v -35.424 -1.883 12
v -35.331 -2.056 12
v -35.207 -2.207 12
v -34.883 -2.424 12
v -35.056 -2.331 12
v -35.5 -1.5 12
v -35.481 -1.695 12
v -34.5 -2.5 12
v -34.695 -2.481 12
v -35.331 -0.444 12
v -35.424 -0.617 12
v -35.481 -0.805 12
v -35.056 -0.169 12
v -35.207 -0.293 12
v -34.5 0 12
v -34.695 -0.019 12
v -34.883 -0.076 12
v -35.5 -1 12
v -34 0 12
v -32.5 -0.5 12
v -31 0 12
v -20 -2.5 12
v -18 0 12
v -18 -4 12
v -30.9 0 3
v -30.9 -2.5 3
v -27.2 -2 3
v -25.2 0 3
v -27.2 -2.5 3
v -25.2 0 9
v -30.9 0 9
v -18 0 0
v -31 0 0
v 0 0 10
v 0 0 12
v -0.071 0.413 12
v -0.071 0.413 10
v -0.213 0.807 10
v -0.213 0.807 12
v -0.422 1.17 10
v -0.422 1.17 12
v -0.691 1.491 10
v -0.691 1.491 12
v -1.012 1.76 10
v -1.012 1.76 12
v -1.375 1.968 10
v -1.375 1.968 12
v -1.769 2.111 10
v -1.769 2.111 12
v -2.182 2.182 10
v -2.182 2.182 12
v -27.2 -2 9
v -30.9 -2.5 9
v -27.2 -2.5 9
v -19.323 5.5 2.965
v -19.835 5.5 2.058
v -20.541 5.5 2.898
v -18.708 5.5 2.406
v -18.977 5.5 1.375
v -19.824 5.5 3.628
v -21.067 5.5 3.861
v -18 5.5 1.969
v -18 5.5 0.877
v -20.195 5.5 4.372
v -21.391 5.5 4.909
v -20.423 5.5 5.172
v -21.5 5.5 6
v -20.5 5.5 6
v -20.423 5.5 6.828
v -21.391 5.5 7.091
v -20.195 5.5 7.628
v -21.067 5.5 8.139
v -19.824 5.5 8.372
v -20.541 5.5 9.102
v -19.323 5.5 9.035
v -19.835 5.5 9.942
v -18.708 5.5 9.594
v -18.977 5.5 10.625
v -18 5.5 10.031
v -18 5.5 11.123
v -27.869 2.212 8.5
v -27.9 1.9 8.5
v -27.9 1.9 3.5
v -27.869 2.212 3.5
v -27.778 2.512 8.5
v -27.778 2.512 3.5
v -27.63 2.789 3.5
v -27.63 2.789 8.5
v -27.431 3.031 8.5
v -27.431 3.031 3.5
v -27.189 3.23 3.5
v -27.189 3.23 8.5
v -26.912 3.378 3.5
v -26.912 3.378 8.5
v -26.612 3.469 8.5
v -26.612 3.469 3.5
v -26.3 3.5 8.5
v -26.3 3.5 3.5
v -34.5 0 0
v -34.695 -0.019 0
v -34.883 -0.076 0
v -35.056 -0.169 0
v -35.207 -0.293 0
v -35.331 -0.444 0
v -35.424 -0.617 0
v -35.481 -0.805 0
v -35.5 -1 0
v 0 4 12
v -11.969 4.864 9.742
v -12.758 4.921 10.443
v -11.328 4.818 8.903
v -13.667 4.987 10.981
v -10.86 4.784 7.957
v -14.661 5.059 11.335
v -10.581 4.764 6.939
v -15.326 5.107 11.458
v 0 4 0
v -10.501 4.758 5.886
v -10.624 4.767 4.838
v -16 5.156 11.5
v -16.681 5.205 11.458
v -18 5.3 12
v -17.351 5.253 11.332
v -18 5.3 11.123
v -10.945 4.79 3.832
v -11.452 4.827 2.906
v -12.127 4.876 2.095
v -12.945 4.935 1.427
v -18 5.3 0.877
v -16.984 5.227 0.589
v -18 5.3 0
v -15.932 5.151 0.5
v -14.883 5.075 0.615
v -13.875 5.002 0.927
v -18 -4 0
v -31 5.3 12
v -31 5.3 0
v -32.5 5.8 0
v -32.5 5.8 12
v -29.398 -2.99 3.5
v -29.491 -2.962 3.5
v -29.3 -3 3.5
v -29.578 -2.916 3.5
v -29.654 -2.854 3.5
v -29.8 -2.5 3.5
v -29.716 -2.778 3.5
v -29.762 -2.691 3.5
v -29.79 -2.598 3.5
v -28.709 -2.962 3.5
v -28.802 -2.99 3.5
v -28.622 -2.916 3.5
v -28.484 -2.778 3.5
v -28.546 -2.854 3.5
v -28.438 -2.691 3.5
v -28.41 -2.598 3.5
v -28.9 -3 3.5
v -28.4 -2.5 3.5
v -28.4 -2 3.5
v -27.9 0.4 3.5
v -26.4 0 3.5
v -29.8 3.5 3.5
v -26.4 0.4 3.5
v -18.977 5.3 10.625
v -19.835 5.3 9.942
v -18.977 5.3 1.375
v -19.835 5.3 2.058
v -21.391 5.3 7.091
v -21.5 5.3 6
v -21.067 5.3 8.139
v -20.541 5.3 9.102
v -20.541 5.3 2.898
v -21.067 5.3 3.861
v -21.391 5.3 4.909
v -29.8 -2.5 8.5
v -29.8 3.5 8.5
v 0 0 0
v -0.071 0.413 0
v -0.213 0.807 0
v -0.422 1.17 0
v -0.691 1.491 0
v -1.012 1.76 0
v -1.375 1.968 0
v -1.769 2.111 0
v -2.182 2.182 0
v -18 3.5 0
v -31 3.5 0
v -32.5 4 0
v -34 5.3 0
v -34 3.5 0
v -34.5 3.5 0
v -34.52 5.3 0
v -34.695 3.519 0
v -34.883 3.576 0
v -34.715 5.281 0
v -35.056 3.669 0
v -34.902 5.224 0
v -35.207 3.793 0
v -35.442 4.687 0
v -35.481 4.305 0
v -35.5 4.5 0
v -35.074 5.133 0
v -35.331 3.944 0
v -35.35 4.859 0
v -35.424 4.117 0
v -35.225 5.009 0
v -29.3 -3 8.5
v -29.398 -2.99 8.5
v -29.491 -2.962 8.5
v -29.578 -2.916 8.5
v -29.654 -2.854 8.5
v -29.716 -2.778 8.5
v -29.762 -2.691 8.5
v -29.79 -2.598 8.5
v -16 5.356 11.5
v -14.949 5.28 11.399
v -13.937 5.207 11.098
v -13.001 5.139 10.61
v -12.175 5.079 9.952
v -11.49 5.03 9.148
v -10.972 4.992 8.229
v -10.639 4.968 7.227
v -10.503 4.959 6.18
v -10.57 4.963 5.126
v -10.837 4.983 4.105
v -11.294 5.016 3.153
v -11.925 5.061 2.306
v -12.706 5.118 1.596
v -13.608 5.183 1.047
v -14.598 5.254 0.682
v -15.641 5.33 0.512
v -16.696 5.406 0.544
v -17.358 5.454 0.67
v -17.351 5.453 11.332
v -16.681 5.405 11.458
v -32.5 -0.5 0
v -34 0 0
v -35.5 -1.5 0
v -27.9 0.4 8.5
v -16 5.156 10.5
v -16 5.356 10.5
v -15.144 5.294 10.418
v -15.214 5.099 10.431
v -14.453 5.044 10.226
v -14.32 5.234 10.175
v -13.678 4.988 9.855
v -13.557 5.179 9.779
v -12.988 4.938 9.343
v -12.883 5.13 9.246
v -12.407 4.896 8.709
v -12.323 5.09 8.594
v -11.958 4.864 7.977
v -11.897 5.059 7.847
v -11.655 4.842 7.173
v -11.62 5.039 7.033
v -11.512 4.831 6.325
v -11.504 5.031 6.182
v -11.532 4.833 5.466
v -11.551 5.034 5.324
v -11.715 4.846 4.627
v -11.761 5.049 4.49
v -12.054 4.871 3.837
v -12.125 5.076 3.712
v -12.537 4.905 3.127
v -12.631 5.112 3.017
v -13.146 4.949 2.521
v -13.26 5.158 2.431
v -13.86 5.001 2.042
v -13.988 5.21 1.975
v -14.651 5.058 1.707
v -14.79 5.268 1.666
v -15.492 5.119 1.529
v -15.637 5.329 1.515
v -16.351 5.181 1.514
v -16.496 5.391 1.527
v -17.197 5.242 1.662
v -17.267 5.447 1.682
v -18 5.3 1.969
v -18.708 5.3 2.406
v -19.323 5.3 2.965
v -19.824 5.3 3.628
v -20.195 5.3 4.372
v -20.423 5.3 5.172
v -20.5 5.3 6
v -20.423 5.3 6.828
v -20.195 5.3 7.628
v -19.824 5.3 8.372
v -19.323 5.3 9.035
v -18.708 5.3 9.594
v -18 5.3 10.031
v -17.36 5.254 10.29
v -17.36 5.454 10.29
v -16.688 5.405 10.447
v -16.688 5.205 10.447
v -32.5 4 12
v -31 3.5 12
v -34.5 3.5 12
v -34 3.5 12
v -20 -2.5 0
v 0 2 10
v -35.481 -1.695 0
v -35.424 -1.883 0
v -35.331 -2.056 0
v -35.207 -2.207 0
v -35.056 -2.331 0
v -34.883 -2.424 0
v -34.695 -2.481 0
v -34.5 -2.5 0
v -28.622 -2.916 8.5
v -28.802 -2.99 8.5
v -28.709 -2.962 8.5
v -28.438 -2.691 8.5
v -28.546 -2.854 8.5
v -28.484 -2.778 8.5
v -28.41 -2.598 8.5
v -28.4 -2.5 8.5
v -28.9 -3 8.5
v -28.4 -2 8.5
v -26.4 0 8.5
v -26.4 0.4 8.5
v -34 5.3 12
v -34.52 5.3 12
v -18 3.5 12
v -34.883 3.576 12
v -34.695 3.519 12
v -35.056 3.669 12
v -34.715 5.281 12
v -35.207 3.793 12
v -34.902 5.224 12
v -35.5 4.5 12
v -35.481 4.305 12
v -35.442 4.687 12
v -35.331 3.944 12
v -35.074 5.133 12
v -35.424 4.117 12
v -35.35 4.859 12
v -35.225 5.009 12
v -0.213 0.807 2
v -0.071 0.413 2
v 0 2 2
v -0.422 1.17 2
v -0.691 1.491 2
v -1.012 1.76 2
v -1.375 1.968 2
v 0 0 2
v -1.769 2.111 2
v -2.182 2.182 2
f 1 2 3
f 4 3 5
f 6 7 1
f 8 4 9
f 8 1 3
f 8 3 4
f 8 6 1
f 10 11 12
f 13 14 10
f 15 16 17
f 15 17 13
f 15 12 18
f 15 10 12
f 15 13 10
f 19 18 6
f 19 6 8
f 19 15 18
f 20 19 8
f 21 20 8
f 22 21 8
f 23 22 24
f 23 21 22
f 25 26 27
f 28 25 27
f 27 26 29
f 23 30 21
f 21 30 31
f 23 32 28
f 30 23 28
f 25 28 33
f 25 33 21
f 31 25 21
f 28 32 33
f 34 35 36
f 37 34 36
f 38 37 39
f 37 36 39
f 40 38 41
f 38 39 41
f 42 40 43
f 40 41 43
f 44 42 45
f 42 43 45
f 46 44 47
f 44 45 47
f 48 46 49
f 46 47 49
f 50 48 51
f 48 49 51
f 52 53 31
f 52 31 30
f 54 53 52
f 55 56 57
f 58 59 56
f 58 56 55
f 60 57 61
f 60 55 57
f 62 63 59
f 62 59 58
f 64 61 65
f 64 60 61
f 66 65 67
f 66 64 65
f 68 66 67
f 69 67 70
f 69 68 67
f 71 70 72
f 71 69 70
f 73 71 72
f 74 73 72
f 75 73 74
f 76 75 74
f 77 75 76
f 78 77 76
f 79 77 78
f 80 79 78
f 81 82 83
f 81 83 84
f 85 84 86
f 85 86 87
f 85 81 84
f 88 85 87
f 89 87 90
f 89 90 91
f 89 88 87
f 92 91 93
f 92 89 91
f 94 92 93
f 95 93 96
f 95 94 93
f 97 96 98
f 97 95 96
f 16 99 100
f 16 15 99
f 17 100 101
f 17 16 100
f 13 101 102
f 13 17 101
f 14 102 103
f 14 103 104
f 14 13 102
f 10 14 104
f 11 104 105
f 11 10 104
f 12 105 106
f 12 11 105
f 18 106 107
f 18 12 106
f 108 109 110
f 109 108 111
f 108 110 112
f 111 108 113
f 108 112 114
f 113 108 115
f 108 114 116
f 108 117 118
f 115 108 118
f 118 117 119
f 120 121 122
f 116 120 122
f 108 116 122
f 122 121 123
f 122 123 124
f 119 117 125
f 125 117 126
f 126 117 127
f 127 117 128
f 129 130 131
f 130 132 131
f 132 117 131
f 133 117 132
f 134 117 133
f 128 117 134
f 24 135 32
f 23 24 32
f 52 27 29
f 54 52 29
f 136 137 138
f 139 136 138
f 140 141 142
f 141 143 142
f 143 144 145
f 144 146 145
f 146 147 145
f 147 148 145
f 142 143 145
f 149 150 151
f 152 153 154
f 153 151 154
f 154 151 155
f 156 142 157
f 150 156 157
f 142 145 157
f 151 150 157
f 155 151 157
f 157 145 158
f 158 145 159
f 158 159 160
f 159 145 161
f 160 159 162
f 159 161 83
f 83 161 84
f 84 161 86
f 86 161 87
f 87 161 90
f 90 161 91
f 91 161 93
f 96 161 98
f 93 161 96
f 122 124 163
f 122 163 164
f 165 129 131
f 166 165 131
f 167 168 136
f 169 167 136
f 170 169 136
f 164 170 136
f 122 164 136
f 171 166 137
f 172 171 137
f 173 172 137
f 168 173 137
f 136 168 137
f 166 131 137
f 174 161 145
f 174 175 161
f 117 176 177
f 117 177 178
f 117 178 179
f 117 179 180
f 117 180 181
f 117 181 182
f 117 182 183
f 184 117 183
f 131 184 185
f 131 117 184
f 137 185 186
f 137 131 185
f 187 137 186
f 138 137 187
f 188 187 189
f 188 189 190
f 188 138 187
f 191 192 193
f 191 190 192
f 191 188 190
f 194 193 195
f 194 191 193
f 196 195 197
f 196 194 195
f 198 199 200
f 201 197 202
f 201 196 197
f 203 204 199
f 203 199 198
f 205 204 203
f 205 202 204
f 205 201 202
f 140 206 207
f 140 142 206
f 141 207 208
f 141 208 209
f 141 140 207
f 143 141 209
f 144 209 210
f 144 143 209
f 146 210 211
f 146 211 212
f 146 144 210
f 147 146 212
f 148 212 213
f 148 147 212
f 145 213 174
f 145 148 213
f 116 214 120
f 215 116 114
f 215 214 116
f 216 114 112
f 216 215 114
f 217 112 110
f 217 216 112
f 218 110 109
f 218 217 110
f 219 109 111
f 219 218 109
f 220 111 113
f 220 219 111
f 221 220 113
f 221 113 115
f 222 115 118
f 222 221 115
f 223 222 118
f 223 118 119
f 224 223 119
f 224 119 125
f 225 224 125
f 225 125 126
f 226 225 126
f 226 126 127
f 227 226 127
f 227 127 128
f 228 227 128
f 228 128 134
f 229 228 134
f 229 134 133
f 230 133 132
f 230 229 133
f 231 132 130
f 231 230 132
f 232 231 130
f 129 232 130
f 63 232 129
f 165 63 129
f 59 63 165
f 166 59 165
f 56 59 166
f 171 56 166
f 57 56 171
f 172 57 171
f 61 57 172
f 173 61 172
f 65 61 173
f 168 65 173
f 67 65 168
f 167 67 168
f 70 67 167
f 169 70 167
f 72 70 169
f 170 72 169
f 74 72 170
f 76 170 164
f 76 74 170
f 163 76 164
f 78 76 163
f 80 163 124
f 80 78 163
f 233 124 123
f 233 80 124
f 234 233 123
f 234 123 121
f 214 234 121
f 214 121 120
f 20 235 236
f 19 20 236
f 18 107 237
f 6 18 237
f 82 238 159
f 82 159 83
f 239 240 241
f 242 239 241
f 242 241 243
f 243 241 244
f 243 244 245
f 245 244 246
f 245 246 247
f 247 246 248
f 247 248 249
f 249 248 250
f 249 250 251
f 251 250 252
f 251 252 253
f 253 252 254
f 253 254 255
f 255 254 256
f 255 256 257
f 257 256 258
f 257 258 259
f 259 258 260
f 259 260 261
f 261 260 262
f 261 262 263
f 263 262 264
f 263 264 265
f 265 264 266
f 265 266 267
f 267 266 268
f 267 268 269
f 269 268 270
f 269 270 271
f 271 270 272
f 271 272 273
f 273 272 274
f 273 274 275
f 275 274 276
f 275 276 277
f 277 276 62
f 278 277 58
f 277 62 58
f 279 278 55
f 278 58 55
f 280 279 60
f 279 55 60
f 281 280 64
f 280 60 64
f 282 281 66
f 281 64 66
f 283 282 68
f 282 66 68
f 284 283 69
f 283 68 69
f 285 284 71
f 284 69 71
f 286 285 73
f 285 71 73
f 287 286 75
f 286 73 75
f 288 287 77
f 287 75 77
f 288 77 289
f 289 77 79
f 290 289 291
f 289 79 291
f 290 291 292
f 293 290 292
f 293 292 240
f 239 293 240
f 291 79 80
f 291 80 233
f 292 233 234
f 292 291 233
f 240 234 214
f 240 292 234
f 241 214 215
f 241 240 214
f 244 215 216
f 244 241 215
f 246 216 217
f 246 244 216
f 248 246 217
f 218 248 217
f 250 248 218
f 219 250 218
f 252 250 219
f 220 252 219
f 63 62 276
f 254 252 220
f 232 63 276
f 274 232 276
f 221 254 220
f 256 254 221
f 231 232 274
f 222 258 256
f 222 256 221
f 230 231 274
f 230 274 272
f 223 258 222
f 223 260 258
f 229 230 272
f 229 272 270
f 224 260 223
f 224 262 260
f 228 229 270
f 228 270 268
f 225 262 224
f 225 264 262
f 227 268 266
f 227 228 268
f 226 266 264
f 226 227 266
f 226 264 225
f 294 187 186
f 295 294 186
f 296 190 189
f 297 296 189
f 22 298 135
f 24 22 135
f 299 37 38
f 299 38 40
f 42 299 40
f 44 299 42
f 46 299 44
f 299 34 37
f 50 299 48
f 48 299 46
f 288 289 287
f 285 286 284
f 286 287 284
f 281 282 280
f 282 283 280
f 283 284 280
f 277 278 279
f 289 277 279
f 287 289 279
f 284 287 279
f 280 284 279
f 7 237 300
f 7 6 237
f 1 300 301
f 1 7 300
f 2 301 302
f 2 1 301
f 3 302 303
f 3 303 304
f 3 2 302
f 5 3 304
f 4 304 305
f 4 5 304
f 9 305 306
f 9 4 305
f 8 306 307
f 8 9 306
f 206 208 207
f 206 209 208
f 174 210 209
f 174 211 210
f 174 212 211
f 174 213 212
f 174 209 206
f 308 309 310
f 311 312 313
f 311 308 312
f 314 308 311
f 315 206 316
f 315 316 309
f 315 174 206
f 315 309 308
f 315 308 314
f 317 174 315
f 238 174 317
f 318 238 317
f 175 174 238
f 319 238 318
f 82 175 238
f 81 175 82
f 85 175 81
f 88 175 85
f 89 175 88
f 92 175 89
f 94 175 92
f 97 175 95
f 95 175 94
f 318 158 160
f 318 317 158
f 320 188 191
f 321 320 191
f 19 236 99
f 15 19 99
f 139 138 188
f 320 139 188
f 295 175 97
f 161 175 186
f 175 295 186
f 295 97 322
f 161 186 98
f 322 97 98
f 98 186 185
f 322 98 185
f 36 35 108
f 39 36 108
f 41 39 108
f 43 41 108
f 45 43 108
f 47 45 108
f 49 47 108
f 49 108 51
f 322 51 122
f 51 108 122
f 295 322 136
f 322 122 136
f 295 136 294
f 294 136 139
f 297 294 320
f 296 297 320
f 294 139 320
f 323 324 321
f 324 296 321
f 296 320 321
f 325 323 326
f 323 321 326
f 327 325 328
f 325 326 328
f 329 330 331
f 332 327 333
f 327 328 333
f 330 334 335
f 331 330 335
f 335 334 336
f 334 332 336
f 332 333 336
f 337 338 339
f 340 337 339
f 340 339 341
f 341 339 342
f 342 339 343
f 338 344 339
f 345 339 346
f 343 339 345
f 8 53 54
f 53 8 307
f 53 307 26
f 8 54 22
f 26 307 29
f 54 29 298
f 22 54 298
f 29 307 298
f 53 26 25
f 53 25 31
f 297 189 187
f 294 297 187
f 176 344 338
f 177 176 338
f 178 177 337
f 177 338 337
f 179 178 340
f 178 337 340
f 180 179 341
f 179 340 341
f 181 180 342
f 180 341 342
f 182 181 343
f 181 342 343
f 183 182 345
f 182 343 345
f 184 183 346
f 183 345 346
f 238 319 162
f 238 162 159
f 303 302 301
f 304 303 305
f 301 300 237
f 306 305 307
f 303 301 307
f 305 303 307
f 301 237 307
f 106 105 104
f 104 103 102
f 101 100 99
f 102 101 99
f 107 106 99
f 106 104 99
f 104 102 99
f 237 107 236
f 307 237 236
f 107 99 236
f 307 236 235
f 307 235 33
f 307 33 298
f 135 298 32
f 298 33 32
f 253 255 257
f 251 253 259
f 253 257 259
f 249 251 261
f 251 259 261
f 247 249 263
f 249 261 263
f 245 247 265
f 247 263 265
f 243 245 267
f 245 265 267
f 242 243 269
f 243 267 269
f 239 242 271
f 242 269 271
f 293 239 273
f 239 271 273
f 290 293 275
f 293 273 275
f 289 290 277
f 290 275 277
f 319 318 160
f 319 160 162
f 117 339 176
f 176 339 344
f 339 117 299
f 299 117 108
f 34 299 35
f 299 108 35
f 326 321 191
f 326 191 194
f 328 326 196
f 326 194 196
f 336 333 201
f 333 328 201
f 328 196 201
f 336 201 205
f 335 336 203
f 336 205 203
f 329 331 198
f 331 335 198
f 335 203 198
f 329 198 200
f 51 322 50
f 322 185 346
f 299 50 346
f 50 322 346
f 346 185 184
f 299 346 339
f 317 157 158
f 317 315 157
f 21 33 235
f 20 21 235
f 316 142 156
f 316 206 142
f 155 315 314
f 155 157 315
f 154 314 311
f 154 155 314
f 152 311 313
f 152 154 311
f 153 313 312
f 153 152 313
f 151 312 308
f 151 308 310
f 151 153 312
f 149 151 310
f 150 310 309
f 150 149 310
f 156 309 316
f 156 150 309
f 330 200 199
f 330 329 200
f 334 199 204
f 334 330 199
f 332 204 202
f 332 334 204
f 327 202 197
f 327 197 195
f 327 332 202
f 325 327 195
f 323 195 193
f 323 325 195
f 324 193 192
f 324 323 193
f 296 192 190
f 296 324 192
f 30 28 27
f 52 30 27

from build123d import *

# Parameters (mm, degrees)
BOSS_EXTRUDE1_DEPTH   = 12
BOSS_EXTRUDE1_2_DEPTH = 12
SKETCH2_W             = 5.7
SKETCH2_H             = 6
CUT_EXTRUDE1_DEPTH    = 3
BOSS_EXTRUDE2_DEPTH   = 6
BOSS_EXTRUDE3_START   = -6
BOSS_EXTRUDE3_DEPTH   = 2.5
FILLET7_R             = 1
FILLET8_R             = 1
FILLET10_R            = 1
FILLET11_R            = 1
BOSS_EXTRUDE4_DEPTH   = 2
BOSS_EXTRUDE5_START   = -10
BOSS_EXTRUDE5_DEPTH   = 2
FILLET12_R            = 0.5
BOSS_EXTRUDE7_REACH   = 45.42
BOSS_EXTRUDE7_START   = 5.5
SKETCH6_R             = 5.5
SKETCH6_R_2           = 4.5
CUT_EXTRUDE3_DEPTH    = 38.919520039


with BuildPart() as part:
    # Sketch1 → Boss-Extrude1 (new body)
    with BuildSketch(Plane.XY):
        Polygon((0, 4), (-18, 5.3), (-31, 5.3), (-32.5, 5.8), (-34, 5.3), (-35.5, 5.3), (-35.5, 3.5), (-34, 3.5), (-32.5, 4), (-31, 3.5), (-18, 3.5), (0, 2), align=None)
    extrude(amount=BOSS_EXTRUDE1_DEPTH)

    # Sketch4 → Boss-Extrude3 (add, symmetric)
    with BuildSketch(Plane.XY.offset(12).offset(BOSS_EXTRUDE3_START)):
        with BuildLine():
            Line((-28.4, -2), (-26.4, 0))
            Line((-26.4, 0), (-26.4, 0.4))
            Line((-26.4, 0.4), (-27.9, 0.4))
            Line((-27.9, 0.4), (-27.9, 1.9))
            ThreePointArc((-27.9, 1.9), (-27.43137085, 3.03137085), (-26.3, 3.5))
            Line((-26.3, 3.5), (-29.8, 3.5))
            Line((-29.8, 3.5), (-29.8, -3))
            Line((-29.8, -3), (-28.4, -3))
            Line((-28.4, -3), (-28.4, -2))
        make_face()
    extrude(amount=BOSS_EXTRUDE3_DEPTH, both=True)

    # Fillet8
    fillet8_edges = [part.edges().sort_by_distance(p)[0] for p in [
        (-35.5, 3.5, 6),
    ]]
    fillet(fillet8_edges, radius=FILLET8_R)

    # Fillet10
    # the kernel refuses this fillet: 1 mm, written as the material it takes off along each edge
    with BuildSketch(Plane(origin=(-35.5, 5.3, -2.449489743), x_dir=(1.545430450277731e-12, -1.0, 0), z_dir=(0, 0, 1))) as fillet10_piece_1:
        with BuildLine():
            CenterArc((1, 0.979795897), FILLET10_R, 180, 78.463040967)
            Line((0, 0.979795897), (-0.02, 0.979795897))
            Line((-0.02, 0.979795897), (-0.02, 0))
            Line((-0.02, 0), (0, -0.02))
            ThreePointArc((0, -0.02), (0.4, -0.02), (0.796, -0.019595918))
            Line((0.796, -0.019595918), (0.8, 0))
        make_face()
    extrude(amount=16.898979486, mode=Mode.SUBTRACT)

    # Sketch5 → Boss-Extrude4 (add)
    with BuildSketch(Plane.XY.offset(12)):
        with BuildLine():
            Line((0, 2), (0, 0))
            ThreePointArc((0, 0), (-0.691300526, 1.490517656), (-2.181818182, 2.181818182))
            Line((-2.181818182, 2.181818182), (0, 2))
        make_face()
    extrude(amount=-BOSS_EXTRUDE4_DEPTH)

    # Sketch5<2> → Boss-Extrude5 (add)
    with BuildSketch(Plane.XY.offset(12).offset(BOSS_EXTRUDE5_START)):
        with BuildLine():
            Line((0, 2), (0, 0))
            ThreePointArc((0, 0), (-0.691300526, 1.490517656), (-2.181818182, 2.181818182))
            Line((-2.181818182, 2.181818182), (0, 2))
        make_face()
    extrude(amount=-BOSS_EXTRUDE5_DEPTH)

    # Fillet12
    fillet12_edges = [part.edges().sort_by_distance(p)[0] for p in [
        (-28.4, -3, 6),
        (-29.8, -3, 6),
    ]]
    fillet(fillet12_edges, radius=FILLET12_R)

    # Sketch6 → Boss-Extrude7 (add, up to next)
    with BuildSketch(Plane(origin=(0, 0, 0), x_dir=(1, 0, 0), z_dir=(0, 1, 0)).offset(BOSS_EXTRUDE7_START), mode=Mode.PRIVATE) as boss_extrude7_sk1:
        with Locations(Location((-16, -6, 0), (0, 0, 270))):
            Circle(SKETCH6_R)
        with Locations(Location((-16, -6, 0), (0, 0, 270))):
            Circle(SKETCH6_R_2, mode=Mode.SUBTRACT)
    boss_extrude7_tool1 = extrude(boss_extrude7_sk1.sketch, amount=-BOSS_EXTRUDE7_REACH, mode=Mode.PRIVATE) - part.part
    add(boss_extrude7_tool1.solids().sort_by_distance((-16, 5.5, 0.655563))[0])

    # Sketch7 → Cut-Extrude3 (cut, through all)
    with BuildSketch(Plane.XY):
        Polygon((-18, 5.5), (-8, 4.777777778), (-8, 5.5), align=None)
    extrude(amount=CUT_EXTRUDE3_DEPTH, mode=Mode.SUBTRACT)


with BuildPart() as body_2:
    # Sketch1 → Boss-Extrude1 2 (new body)
    with BuildSketch(Plane.XY):
        Polygon((-35.5, -2.5), (-20, -2.5), (-18, -4), (-18, 0), (-31, 0), (-32.5, -0.5), (-34, 0), (-35.5, 0), align=None)
    extrude(amount=BOSS_EXTRUDE1_2_DEPTH)

    # Sketch2 → Cut-Extrude1 (cut)
    with BuildSketch(Plane.XZ.offset(2.5)):
        with Locations((-28.05, 6)):
            Rectangle(SKETCH2_W, SKETCH2_H)
    extrude(amount=-CUT_EXTRUDE1_DEPTH, mode=Mode.SUBTRACT)

    # Sketch3 → Boss-Extrude2 (add)
    with BuildSketch(Plane.XY.offset(3)):
        Polygon((-25.2, 0), (-27.2, -2), (-27.2, -2.5), (-25.2, -2.5), align=None)
    extrude(amount=BOSS_EXTRUDE2_DEPTH)

    # Fillet7
    fillet7_edges = [body_2.edges().sort_by_distance(p)[0] for p in [
        (-35.5, 0, 6),
    ]]
    fillet(fillet7_edges, radius=FILLET7_R)

    # Fillet11
    fillet11_edges = [body_2.edges().sort_by_distance(p)[0] for p in [
        (-35.5, -2.5, 6),
    ]]
    fillet(fillet11_edges, radius=FILLET11_R)


solid = Compound([part.part, body_2.part])
